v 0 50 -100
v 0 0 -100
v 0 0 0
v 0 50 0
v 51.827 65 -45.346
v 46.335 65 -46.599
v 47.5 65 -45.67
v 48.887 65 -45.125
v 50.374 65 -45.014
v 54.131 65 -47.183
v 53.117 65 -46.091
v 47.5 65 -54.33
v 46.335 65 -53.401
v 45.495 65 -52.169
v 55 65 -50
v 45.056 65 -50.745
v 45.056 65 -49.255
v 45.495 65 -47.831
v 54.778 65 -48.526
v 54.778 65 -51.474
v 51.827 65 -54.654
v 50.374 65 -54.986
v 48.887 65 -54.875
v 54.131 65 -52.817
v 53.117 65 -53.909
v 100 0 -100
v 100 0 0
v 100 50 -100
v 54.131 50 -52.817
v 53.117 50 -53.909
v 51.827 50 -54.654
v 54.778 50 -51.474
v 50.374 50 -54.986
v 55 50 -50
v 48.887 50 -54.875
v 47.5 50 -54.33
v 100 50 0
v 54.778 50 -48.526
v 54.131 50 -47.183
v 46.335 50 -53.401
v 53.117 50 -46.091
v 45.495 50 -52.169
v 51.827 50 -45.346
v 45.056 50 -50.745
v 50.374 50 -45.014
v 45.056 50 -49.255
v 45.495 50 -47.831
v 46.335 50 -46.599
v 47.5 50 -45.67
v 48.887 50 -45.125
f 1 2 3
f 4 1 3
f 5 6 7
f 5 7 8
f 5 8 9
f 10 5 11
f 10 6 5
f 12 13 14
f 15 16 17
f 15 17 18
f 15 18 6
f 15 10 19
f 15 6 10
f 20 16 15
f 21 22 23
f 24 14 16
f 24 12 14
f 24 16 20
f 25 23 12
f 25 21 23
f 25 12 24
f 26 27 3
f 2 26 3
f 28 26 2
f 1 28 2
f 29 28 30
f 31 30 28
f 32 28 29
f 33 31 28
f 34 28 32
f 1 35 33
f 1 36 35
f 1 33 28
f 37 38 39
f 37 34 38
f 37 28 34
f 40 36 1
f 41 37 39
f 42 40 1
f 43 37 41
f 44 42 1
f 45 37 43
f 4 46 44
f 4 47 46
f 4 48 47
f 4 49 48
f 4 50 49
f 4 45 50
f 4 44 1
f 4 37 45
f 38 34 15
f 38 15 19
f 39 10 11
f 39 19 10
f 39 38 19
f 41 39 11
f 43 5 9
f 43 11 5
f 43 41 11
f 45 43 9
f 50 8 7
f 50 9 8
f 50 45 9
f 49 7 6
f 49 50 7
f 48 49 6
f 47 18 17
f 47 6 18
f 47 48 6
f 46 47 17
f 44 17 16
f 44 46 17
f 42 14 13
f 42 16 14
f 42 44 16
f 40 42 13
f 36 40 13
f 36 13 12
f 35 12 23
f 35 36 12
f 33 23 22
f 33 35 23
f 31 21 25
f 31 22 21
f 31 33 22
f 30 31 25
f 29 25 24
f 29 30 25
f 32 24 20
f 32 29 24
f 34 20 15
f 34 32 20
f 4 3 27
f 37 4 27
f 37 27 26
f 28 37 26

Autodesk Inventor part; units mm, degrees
ref_plane "YZ Plane" through (0, 0, 0) normal (1, 0, 0) x (0, 1, 0)
ref_plane "XZ Plane" through (0, 0, 0) normal (0, 1, 0) x (-1, 0, 0)
ref_plane "XY Plane" through (0, 0, 0) normal (0, 0, 1) x (1, 0, 0)
sketch "Sketch1" plane through (0, 0, 0) normal (0, 1, 0) x (-1, 0, 0)
  point P0 (0, 0)
sketch "Sketch2" plane through (0, 0, 0) normal (0, 1, 0) x (-1, 0, 0)
  line L0 (0, 0) -> (-100, 0)
  line L1 (-100, 0) -> (-100, -100)
  line L2 (-100, -100) -> (0, -100)
  line L3 (0, -100) -> (0, 0)
  dimension "d0" = 100
  dimension "d1" = 100
extrude "Extrusion1" add sketch "Sketch2" along normal blind 50
sketch "Sketch3" plane through (0, 50, 0) normal (0, 1, 0) x (1, 0, 0)
  circle A0 centre (50, 50) radius 5
  point P0 (0, 0)
  dimension "d4" = 10
extrude "Extrusion2" add sketch "Sketch3" along normal blind 15
sketch "Sketch4" plane through (50, 65, -50) normal (0, 1, 0) x (1, 0, 0)
  point P0 (-50, -50)
properties part number "Base"
